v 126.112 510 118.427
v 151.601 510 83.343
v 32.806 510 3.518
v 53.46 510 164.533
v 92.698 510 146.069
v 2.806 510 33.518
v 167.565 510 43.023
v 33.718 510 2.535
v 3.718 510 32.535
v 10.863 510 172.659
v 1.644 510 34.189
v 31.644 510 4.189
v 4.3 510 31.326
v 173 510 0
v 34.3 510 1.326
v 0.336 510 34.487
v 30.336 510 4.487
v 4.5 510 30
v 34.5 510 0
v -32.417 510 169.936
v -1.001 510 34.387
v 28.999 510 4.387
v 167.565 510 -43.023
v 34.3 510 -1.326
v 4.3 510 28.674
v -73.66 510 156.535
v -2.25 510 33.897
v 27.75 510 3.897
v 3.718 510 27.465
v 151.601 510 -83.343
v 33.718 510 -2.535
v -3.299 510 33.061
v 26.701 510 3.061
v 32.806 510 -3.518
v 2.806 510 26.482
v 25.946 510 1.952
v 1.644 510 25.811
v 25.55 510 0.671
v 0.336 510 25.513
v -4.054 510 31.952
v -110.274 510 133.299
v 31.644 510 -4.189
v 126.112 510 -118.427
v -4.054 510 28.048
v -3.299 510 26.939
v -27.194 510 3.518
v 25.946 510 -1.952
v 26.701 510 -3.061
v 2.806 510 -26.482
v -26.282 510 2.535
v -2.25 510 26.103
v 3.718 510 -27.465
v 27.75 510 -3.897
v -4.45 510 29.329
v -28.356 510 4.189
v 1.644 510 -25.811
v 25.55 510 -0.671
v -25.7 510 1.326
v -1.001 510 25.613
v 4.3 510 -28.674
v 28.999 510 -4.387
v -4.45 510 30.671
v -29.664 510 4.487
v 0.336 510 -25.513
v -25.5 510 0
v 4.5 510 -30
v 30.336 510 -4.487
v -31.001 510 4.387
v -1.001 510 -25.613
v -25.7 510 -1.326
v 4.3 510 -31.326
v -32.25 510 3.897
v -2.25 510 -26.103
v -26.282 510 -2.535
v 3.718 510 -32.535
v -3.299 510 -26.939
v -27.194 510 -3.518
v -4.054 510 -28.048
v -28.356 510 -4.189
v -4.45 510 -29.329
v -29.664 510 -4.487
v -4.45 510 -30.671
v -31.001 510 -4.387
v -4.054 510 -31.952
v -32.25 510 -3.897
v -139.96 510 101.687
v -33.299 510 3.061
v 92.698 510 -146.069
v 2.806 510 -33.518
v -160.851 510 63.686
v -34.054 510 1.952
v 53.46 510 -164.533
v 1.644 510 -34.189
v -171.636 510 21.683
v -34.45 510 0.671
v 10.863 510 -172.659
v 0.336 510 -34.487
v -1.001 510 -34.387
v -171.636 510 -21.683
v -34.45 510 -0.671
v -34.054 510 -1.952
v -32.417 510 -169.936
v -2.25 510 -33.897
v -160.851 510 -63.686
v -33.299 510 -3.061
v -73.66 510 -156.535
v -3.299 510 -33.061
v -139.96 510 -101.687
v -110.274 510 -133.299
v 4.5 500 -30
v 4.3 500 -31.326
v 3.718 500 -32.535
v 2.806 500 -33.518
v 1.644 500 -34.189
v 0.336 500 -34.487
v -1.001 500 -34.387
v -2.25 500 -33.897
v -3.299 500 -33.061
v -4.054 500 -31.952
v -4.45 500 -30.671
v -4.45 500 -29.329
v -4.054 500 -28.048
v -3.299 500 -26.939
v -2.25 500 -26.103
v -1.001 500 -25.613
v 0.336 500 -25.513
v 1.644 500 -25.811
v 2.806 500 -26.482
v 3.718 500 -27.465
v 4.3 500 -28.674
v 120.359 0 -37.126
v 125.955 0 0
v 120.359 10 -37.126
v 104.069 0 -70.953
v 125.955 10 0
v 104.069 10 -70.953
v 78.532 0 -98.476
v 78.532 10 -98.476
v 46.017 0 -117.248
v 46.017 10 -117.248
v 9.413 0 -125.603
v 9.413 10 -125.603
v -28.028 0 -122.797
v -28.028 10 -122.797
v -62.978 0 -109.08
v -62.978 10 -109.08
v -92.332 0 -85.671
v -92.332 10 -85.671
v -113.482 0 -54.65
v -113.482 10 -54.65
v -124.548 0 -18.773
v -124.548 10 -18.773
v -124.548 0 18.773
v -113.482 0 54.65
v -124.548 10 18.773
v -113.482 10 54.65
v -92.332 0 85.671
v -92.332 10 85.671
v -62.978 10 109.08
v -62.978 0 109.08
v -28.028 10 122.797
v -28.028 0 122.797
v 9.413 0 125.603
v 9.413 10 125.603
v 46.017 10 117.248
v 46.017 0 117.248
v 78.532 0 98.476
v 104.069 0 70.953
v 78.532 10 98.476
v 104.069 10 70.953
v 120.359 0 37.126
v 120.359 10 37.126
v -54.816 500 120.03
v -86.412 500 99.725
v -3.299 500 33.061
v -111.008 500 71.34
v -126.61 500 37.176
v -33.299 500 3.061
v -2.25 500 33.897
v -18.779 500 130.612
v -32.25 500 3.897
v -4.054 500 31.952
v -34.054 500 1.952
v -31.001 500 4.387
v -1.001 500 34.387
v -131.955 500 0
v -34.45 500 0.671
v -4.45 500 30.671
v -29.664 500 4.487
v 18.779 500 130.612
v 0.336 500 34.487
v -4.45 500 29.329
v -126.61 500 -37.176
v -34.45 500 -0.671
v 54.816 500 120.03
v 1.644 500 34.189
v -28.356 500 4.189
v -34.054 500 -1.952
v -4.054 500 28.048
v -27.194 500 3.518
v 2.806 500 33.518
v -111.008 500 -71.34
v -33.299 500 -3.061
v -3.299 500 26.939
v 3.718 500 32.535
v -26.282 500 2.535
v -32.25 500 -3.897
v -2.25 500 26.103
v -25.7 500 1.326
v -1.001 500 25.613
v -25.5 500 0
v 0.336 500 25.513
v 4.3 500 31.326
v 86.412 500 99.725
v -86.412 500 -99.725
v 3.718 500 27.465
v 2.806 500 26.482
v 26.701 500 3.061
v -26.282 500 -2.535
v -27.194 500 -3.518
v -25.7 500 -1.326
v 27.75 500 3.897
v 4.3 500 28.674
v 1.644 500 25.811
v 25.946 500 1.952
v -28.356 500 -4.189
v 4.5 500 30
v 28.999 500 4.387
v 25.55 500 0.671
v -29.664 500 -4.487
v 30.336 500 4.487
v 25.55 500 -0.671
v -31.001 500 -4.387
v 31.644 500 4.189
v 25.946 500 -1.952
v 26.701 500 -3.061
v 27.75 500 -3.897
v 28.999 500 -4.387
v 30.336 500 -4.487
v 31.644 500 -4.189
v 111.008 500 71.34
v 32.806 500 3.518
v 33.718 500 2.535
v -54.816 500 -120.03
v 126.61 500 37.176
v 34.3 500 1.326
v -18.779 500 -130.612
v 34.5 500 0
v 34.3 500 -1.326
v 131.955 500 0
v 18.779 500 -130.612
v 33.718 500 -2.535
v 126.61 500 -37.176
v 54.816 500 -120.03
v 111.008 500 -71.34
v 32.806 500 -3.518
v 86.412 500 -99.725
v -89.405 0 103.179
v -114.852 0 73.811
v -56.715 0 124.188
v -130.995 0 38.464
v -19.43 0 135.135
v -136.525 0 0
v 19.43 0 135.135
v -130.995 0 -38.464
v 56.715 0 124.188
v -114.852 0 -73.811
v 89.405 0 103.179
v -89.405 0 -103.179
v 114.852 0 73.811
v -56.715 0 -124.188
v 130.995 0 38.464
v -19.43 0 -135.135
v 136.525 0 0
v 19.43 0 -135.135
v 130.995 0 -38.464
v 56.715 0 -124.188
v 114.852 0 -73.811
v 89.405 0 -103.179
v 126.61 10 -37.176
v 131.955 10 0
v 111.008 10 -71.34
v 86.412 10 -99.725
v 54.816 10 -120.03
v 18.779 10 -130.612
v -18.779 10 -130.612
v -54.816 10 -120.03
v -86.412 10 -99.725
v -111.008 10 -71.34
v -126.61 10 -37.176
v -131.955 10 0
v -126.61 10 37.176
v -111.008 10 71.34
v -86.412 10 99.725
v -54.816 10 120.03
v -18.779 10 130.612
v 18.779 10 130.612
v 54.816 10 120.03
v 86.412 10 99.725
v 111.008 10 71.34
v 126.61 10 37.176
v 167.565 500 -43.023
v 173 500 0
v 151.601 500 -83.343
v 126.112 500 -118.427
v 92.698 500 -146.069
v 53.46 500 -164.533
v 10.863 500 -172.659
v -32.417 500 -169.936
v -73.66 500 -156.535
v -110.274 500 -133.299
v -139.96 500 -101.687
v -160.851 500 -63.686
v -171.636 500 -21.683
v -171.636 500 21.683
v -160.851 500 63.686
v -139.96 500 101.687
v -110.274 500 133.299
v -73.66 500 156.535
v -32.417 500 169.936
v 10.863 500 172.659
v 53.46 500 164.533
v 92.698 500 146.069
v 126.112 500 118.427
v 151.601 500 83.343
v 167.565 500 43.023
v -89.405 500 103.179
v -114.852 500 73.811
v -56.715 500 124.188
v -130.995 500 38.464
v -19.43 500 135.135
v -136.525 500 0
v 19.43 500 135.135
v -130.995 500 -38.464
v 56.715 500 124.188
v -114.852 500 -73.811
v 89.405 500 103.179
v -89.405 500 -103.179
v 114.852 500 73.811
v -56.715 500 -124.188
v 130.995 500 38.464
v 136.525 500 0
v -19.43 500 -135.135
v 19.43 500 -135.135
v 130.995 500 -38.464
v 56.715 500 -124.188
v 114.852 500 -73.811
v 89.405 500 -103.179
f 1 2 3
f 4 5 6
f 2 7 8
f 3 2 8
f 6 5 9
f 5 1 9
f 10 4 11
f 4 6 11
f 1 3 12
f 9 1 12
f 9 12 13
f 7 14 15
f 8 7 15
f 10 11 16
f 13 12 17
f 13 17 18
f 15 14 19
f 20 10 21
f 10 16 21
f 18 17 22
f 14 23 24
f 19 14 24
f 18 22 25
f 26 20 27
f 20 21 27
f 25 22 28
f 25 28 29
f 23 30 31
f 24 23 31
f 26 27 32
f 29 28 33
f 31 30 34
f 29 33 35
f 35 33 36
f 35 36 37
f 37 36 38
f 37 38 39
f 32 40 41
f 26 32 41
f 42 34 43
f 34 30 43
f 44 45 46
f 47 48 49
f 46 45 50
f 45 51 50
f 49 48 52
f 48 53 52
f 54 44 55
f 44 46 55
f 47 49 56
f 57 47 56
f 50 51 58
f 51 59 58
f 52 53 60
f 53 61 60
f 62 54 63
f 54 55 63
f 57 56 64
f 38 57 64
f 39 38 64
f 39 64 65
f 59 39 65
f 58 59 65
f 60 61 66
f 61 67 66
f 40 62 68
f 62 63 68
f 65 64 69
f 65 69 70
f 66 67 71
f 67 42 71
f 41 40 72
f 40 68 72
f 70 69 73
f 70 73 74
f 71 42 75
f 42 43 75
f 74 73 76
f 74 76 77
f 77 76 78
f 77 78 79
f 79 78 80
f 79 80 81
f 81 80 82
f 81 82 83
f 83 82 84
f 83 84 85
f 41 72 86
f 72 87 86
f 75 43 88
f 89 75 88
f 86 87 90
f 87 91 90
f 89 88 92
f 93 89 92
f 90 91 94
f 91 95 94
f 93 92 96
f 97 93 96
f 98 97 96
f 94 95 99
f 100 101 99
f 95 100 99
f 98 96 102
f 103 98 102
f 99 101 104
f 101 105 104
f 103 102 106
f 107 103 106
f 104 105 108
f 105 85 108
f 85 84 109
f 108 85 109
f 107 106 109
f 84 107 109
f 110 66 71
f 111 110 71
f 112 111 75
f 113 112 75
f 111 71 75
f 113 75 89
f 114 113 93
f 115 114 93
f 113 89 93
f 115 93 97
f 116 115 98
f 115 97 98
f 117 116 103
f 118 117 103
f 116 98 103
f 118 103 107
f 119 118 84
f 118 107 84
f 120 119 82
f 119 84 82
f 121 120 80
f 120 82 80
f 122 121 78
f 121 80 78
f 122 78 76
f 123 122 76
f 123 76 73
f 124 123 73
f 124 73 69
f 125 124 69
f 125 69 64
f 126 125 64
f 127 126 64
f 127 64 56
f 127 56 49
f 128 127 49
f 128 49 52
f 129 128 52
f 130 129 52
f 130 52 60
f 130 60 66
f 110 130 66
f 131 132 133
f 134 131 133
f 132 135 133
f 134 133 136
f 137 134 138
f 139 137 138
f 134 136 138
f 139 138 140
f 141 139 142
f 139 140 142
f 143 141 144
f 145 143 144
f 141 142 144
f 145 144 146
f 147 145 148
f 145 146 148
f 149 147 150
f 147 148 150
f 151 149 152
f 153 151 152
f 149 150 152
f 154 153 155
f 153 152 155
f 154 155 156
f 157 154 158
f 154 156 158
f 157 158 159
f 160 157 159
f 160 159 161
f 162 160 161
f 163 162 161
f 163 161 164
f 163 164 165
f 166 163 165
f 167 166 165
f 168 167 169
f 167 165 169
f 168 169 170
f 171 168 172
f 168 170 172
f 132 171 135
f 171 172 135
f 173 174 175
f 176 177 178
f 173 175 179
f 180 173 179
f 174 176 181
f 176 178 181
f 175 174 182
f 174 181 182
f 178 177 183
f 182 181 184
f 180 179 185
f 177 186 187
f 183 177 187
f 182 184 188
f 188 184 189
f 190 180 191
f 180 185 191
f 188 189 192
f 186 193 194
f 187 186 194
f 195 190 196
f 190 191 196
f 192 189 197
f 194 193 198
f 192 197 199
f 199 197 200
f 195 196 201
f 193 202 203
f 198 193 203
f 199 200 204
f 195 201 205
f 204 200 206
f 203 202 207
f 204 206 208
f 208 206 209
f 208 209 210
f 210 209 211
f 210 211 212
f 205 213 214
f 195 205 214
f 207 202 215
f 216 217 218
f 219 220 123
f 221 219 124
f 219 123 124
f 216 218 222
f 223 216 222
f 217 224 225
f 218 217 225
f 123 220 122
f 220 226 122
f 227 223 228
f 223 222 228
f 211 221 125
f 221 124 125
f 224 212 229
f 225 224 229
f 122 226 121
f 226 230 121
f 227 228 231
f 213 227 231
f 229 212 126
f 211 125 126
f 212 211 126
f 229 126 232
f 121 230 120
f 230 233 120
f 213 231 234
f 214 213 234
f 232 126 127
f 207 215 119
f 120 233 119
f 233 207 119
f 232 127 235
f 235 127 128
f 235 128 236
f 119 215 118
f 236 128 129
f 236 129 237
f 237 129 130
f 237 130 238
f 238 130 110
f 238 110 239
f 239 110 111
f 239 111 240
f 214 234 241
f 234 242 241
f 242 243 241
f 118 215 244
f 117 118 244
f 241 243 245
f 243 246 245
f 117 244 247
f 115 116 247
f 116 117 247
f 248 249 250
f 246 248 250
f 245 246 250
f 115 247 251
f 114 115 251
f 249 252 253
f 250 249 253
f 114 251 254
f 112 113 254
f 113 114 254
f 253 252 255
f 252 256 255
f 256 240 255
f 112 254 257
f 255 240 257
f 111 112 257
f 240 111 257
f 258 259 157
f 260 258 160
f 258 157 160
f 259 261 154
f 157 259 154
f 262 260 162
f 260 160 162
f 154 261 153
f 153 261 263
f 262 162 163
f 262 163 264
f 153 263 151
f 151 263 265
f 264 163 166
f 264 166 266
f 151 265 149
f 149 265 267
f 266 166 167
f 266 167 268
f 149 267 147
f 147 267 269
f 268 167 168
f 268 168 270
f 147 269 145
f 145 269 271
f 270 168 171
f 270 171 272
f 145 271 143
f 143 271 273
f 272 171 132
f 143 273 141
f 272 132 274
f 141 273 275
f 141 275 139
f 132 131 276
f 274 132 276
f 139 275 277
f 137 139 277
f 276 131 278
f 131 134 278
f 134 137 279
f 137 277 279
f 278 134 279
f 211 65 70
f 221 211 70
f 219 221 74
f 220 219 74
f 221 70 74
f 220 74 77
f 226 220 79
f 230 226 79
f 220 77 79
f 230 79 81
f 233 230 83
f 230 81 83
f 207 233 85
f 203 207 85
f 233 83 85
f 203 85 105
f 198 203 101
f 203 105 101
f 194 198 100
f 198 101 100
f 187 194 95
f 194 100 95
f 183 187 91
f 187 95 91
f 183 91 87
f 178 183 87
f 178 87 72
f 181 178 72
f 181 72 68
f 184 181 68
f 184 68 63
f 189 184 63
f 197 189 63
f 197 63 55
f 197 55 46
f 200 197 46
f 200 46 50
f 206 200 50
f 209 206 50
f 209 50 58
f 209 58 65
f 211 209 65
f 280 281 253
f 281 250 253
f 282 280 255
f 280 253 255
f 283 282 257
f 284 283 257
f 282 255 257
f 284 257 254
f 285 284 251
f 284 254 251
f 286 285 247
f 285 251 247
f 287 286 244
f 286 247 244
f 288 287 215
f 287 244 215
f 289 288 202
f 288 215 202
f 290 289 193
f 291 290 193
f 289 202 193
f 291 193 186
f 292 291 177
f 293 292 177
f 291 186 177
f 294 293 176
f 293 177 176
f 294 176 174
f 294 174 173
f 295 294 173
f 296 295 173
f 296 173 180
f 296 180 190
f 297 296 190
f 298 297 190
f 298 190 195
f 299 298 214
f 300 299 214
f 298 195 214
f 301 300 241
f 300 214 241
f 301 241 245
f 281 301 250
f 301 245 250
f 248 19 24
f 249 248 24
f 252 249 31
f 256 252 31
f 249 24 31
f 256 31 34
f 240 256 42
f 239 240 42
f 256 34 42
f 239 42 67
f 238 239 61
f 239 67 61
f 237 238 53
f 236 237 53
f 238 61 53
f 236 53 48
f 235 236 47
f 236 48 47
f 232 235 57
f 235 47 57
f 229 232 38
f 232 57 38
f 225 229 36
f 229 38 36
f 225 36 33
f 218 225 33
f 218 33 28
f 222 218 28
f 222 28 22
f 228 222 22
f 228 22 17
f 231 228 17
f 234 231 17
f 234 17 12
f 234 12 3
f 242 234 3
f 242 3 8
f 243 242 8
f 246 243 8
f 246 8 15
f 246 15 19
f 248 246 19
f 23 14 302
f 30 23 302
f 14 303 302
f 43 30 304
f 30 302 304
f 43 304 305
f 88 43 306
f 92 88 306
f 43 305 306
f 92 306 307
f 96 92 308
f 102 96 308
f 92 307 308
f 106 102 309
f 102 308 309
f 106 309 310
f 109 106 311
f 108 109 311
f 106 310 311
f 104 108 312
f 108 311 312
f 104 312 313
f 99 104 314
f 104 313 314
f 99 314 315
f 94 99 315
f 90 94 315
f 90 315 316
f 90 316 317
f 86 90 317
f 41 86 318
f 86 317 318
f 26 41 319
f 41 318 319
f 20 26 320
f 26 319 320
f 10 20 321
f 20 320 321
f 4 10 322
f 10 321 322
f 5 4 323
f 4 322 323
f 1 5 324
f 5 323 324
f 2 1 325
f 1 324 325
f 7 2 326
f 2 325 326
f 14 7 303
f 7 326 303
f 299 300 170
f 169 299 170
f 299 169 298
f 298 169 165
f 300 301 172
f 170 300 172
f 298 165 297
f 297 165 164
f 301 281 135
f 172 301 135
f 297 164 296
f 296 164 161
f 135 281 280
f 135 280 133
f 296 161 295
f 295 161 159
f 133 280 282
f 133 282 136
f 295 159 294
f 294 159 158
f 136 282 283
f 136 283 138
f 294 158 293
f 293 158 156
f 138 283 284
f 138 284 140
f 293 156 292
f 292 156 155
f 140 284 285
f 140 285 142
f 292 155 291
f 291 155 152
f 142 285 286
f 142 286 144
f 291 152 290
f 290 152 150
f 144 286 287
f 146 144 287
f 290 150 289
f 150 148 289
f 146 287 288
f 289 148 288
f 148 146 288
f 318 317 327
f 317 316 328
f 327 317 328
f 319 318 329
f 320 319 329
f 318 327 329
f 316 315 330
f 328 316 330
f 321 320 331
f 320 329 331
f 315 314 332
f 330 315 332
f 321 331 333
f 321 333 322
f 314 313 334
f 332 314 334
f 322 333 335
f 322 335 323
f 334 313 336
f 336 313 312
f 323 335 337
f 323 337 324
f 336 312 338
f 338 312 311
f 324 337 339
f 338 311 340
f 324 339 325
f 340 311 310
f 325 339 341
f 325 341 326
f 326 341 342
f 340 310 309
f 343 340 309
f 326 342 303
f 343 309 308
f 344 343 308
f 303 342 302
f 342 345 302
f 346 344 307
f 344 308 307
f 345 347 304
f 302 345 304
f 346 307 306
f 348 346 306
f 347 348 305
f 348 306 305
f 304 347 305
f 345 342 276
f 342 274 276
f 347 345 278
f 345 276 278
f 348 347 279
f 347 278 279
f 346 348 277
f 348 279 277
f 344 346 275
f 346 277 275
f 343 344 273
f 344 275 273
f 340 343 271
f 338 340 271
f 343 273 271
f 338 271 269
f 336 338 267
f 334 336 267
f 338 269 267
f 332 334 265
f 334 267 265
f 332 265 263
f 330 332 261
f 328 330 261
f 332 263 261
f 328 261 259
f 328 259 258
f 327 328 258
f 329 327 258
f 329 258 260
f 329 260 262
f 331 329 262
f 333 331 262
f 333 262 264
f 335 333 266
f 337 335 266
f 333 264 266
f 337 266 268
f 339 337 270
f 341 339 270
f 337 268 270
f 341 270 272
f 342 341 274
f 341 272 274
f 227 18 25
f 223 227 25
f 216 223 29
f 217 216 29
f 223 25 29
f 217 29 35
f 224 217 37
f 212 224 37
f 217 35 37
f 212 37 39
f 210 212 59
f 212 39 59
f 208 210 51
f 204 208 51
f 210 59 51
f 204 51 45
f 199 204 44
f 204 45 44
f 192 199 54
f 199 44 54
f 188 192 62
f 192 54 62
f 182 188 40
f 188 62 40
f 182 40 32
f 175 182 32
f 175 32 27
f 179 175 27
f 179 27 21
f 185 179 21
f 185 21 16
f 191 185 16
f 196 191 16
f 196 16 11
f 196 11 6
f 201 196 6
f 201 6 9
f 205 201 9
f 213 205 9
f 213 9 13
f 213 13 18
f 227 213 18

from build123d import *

# Parameters (mm, degrees)
CORTE_EXTRUS_O1_REACH = 512
ESBO_O2_R             = 4.5


with BuildPart() as part:
    # Esboço1 → Revolução1 (revolve)
    with BuildSketch(Plane.XY):
        Polygon((0, 510), (173, 510), (173, 500), (136.525, 500), (136.525, 0), (125.955, 0), (125.955, 10), (131.955, 10), (131.955, 500), (0, 500), align=None)
    revolve(axis=Axis((0, 0, 0), (0, 1, 0)))

    # Esboço2 → Corte-extrusão1 (cut, up to next)
    with BuildSketch(Plane(origin=(0, 510, 0), x_dir=(1, 0, 0), z_dir=(0, 1, 0)), mode=Mode.PRIVATE) as corte_extrus_o1_sk1:
        with Locations((0, 30)):
            Circle(ESBO_O2_R)
    corte_extrus_o1_tool1 = extrude(corte_extrus_o1_sk1.sketch, amount=-CORTE_EXTRUS_O1_REACH, mode=Mode.PRIVATE) & part.part
    add(corte_extrus_o1_tool1.solids().sort_by_distance((0, 510, -30))[0], mode=Mode.SUBTRACT)
    # Esboço2 → Corte-extrusão1 (cut, up to next)
    with BuildSketch(Plane(origin=(0, 510, 0), x_dir=(1, 0, 0), z_dir=(0, 1, 0)), mode=Mode.PRIVATE) as corte_extrus_o1_sk2:
        with Locations((30, 0)):
            Circle(ESBO_O2_R)
    corte_extrus_o1_tool2 = extrude(corte_extrus_o1_sk2.sketch, amount=-CORTE_EXTRUS_O1_REACH, mode=Mode.PRIVATE) & part.part
    add(corte_extrus_o1_tool2.solids().sort_by_distance((30, 510, 0))[0], mode=Mode.SUBTRACT)
    # Esboço2 → Corte-extrusão1 (cut, up to next)
    with BuildSketch(Plane(origin=(0, 510, 0), x_dir=(1, 0, 0), z_dir=(0, 1, 0)), mode=Mode.PRIVATE) as corte_extrus_o1_sk3:
        with Locations((0, -30)):
            Circle(ESBO_O2_R)
    corte_extrus_o1_tool3 = extrude(corte_extrus_o1_sk3.sketch, amount=-CORTE_EXTRUS_O1_REACH, mode=Mode.PRIVATE) & part.part
    add(corte_extrus_o1_tool3.solids().sort_by_distance((0, 510, 30))[0], mode=Mode.SUBTRACT)
    # Esboço2 → Corte-extrusão1 (cut, up to next)
    with BuildSketch(Plane(origin=(0, 510, 0), x_dir=(1, 0, 0), z_dir=(0, 1, 0)), mode=Mode.PRIVATE) as corte_extrus_o1_sk4:
        with Locations((-30, 0)):
            Circle(ESBO_O2_R)
    corte_extrus_o1_tool4 = extrude(corte_extrus_o1_sk4.sketch, amount=-CORTE_EXTRUS_O1_REACH, mode=Mode.PRIVATE) & part.part
    add(corte_extrus_o1_tool4.solids().sort_by_distance((-30, 510, 0))[0], mode=Mode.SUBTRACT)


solid = part.part
